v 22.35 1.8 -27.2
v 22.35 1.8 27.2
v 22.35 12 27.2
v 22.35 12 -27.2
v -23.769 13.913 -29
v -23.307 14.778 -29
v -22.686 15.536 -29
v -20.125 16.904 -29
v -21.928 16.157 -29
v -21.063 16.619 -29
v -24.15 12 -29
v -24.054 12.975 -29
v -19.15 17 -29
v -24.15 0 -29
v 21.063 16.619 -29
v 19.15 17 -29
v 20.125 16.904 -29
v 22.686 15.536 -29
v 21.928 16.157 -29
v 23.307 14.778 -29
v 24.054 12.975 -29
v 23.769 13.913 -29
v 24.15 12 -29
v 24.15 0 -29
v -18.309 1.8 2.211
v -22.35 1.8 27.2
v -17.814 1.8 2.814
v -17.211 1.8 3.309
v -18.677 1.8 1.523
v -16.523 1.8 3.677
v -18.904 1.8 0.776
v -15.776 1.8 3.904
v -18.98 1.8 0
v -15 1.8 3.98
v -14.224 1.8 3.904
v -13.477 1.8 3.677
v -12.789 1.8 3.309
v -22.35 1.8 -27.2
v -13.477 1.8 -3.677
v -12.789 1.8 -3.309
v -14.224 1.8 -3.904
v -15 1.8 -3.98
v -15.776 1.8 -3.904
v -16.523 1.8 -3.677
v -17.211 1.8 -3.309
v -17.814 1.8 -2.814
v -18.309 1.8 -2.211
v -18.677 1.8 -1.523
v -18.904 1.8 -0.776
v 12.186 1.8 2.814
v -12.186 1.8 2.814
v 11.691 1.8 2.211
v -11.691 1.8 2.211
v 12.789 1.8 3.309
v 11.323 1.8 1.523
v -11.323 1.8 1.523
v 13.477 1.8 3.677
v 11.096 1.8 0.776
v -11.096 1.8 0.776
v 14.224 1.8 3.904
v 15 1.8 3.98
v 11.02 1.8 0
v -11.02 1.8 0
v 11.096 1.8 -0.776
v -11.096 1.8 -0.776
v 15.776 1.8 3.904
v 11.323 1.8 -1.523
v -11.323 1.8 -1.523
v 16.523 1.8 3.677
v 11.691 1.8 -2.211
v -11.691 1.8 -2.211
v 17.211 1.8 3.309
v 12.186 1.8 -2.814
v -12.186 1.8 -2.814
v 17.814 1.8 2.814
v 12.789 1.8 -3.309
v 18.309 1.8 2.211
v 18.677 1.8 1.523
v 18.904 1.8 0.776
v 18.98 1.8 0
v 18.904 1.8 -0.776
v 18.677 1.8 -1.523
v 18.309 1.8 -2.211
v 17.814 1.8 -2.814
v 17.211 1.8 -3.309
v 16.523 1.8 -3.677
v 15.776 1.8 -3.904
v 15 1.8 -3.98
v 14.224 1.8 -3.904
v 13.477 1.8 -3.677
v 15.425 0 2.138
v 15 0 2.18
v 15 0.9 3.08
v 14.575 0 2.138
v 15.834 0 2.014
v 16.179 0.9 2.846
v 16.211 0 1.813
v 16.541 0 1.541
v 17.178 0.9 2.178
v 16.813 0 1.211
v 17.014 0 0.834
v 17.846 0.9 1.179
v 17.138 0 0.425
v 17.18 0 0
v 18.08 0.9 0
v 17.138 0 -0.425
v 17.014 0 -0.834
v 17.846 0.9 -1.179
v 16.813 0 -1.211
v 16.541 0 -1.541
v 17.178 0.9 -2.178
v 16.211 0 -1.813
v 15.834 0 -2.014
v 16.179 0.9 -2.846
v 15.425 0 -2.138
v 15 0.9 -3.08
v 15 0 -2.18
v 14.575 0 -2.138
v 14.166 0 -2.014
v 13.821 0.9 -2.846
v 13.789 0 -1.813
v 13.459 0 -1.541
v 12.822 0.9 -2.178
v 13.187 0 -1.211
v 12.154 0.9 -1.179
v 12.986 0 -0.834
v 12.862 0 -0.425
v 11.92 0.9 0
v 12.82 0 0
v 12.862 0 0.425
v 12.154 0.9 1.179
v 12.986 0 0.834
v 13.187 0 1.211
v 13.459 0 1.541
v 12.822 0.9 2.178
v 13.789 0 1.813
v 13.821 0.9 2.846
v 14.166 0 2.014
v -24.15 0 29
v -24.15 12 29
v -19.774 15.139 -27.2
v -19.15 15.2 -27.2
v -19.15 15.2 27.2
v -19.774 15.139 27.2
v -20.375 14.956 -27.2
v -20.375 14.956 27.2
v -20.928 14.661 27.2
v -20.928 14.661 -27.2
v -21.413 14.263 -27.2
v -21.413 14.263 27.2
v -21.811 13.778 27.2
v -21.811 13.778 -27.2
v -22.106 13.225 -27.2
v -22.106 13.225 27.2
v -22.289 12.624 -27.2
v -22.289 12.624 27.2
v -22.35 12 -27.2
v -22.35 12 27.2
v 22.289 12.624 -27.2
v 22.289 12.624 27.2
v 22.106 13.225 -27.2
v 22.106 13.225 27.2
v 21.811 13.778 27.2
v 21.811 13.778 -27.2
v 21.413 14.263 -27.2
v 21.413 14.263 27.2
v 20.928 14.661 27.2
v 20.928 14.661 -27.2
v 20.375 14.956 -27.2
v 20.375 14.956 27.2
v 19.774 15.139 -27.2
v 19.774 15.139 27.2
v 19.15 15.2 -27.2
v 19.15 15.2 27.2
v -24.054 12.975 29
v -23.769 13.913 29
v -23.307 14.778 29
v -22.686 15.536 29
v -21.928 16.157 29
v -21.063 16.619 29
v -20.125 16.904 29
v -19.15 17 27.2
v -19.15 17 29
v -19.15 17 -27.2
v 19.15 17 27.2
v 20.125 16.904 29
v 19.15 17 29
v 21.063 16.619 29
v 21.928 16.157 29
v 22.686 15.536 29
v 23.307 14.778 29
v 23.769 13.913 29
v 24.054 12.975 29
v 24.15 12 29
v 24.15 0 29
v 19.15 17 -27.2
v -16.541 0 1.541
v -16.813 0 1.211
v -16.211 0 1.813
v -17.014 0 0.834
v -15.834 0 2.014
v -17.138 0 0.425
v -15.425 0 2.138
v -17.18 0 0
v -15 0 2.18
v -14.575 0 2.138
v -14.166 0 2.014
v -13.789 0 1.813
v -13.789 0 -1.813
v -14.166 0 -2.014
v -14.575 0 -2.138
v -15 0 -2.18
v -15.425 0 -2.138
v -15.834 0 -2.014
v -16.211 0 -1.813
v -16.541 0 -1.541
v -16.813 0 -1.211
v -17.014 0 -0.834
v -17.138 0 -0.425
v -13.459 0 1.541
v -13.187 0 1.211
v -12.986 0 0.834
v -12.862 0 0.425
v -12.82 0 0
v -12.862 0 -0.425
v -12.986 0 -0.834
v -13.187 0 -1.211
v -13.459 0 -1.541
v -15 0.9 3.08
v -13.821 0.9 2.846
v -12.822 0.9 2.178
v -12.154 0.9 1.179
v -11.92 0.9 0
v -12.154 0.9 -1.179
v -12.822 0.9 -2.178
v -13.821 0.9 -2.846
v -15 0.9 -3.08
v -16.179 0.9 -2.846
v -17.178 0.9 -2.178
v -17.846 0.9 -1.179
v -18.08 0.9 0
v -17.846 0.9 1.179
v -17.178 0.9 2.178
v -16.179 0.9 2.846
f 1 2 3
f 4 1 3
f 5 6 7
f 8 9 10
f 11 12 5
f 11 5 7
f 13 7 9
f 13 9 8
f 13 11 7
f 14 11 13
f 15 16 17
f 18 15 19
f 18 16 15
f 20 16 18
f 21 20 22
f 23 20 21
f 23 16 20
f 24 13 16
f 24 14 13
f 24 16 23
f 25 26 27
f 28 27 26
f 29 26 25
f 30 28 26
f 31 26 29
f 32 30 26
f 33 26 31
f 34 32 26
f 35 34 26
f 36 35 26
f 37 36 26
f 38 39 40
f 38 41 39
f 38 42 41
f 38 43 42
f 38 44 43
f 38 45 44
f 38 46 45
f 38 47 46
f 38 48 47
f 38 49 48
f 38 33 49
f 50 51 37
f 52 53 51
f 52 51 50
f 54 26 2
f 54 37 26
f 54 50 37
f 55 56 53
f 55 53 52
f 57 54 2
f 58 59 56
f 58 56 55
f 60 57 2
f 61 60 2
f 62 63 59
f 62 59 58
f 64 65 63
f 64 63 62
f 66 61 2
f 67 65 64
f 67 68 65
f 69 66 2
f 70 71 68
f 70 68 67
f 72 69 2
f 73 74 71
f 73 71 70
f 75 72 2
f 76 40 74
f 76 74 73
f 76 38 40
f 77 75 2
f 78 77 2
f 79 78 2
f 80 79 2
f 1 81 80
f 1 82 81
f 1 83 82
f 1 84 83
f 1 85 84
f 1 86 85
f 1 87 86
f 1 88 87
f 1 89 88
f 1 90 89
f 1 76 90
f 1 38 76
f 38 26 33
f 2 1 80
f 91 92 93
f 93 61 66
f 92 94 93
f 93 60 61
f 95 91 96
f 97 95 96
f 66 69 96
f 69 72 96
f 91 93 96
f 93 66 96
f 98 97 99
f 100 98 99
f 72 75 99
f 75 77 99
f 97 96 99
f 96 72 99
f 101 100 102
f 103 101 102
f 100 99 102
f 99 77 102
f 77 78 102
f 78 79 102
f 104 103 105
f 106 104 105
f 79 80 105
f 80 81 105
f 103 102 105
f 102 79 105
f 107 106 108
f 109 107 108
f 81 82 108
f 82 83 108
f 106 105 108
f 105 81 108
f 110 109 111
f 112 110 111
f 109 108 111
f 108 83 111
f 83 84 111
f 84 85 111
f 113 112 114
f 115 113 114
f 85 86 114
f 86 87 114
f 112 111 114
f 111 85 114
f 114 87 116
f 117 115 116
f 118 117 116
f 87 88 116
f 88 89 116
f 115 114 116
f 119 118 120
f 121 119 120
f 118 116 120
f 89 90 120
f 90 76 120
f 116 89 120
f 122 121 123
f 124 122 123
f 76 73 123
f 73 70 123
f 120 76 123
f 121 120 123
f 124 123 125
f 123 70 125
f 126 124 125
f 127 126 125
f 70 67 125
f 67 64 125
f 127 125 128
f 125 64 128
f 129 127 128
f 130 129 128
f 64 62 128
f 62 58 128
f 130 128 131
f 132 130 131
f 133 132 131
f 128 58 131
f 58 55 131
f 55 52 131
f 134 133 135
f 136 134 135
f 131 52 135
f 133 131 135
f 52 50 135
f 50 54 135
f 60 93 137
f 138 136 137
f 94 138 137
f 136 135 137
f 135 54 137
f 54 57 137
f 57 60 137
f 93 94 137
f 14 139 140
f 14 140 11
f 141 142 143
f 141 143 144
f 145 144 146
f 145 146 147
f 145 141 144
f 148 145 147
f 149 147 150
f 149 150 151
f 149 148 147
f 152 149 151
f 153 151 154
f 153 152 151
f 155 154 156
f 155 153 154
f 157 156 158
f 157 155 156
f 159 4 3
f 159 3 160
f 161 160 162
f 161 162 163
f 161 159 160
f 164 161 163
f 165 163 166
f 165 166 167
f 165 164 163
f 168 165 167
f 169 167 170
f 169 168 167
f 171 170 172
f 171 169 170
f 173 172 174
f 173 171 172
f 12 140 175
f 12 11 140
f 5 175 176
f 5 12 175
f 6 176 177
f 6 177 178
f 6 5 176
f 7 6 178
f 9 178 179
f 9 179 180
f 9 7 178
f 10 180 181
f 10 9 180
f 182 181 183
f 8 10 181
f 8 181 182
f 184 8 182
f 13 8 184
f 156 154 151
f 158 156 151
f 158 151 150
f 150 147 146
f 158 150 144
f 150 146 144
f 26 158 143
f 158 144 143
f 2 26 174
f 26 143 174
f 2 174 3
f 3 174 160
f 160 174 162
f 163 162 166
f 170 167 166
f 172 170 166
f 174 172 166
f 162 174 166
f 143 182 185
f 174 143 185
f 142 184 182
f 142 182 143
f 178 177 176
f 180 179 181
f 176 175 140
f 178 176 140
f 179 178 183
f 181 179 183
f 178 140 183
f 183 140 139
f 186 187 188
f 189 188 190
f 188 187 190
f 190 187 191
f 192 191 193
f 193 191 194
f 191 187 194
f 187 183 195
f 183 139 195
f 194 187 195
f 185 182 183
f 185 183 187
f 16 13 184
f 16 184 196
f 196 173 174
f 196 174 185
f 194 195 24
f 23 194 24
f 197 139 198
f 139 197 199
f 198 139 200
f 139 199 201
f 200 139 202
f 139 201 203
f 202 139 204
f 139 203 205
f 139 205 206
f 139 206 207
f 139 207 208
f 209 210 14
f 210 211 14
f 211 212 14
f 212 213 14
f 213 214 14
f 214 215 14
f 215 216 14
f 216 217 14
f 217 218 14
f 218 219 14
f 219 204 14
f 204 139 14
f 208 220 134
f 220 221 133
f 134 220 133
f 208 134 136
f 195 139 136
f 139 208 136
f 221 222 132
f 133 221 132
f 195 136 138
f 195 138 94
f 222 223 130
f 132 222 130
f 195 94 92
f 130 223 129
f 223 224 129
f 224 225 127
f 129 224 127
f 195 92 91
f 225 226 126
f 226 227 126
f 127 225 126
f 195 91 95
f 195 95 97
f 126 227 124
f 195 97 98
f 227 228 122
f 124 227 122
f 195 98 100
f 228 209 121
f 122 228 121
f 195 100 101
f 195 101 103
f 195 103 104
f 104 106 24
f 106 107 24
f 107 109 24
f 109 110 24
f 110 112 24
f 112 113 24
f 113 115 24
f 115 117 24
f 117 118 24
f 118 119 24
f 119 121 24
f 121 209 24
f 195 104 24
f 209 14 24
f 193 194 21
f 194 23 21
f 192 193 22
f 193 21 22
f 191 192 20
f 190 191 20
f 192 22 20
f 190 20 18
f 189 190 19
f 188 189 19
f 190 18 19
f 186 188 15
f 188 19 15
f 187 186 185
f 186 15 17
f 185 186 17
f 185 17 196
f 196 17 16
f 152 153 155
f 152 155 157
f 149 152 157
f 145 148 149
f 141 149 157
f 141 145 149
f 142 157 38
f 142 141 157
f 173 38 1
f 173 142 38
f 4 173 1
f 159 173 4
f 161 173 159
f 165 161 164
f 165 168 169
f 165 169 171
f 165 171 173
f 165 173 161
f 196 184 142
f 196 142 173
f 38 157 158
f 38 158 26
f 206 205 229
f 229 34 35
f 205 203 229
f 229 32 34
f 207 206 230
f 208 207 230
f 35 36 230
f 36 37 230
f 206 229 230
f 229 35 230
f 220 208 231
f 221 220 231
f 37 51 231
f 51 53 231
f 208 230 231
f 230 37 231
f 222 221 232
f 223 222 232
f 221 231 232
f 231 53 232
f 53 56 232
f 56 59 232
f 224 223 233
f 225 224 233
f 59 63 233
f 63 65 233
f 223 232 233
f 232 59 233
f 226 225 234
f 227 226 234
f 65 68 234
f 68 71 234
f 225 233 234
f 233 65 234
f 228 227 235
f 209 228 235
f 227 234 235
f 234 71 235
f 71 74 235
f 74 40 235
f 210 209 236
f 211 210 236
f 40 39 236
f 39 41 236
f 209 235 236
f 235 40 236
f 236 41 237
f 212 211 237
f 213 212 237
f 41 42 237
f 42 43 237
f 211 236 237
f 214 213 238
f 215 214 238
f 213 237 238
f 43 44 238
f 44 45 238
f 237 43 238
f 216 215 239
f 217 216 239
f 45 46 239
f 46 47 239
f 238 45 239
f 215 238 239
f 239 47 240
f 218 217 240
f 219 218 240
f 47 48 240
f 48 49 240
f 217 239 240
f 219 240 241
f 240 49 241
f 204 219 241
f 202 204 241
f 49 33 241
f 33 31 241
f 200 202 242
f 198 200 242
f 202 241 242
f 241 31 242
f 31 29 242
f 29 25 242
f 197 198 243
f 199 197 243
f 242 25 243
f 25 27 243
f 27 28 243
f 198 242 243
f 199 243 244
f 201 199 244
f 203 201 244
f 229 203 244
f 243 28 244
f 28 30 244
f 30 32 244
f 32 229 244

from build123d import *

# Parameters (mm, degrees)
SKETCH1_W           = 48.3
SKETCH1_H           = 58
BOSS_EXTRUDE1_DEPTH = 17
FILLET1_R           = 5
SHELL2_START        = -27.2
SHELL2_DEPTH        = 54.4
SKETCH2_R           = 1.75
CUT_EXTRUDE1_DEPTH  = 17
CHAMFER1_SIZE       = 2.23


# Read off the part's stored shape, not the designer's step: Shell2
with BuildPart() as part:
    # Sketch1 → Boss-Extrude1 (new body)
    with BuildSketch(Plane(origin=(0, 0, 0), x_dir=(1, 0, 0), z_dir=(0, 1, 0))):
        Rectangle(SKETCH1_W, SKETCH1_H)
    extrude(amount=BOSS_EXTRUDE1_DEPTH)

    # Fillet1
    fillet1_edges = [part.edges().sort_by_distance(p)[0] for p in [
        (-24.15, 17, 0),
        (24.15, 17, 0),
    ]]
    fillet(fillet1_edges, radius=FILLET1_R)

    # Shell2 outline → Shell2 (cut)
    with BuildSketch(Plane.XY.offset(SHELL2_START)):
        with BuildLine():
            Line((19.15, 15.2), (19.15, 17))
            Line((19.15, 17), (-19.15, 17))
            Line((-19.15, 17), (-19.15, 15.2))
            ThreePointArc((-19.15, 15.2), (-21.4127417, 14.2627417), (-22.35, 12))
            Line((-22.35, 12), (-22.35, 1.8))
            Line((-22.35, 1.8), (22.35, 1.8))
            Line((22.35, 1.8), (22.35, 12))
            ThreePointArc((22.35, 12), (21.4127417, 14.2627417), (19.15, 15.2))
        make_face()
    extrude(amount=SHELL2_DEPTH, mode=Mode.SUBTRACT)

    # Sketch2 → Cut-Extrude1 (cut)
    with BuildSketch(Plane(origin=(0, 1.8, 0), x_dir=(1, 0, 0), z_dir=(0, 1, 0))):
        with Locations(Location((-15, 0, 0), (0, 0, 270))):
            Circle(SKETCH2_R)
        with Locations(Location((15, 0, 0), (0, 0, 270))):
            Circle(SKETCH2_R)
    extrude(amount=-CUT_EXTRUDE1_DEPTH, mode=Mode.SUBTRACT)

    # Chamfer1
    # the kernel refuses this chamfer: 2.23 mm, written as the material it takes off along each edge
    with BuildSketch(Plane(origin=(-15, 1.8, 0), x_dir=(0, 0, 1), z_dir=(-1, 0, 0))) as chamfer1_piece_1:
        Polygon((1.75, -CHAMFER1_SIZE), (1.75 + CHAMFER1_SIZE, 0), (1.75, 0), align=None)
    revolve(axis=Axis((-15, 1.8, 0), (0, 1, 0)), mode=Mode.SUBTRACT)
    with BuildSketch(Plane(origin=(15, 1.8, 0), x_dir=(0, 0, 1), z_dir=(-1, 0, 0))) as chamfer1_piece_2:
        Polygon((1.75, -CHAMFER1_SIZE), (1.75 + CHAMFER1_SIZE, 0), (1.75, 0), align=None)
    revolve(axis=Axis((15, 1.8, 0), (0, 1, 0)), mode=Mode.SUBTRACT)


solid = part.part
